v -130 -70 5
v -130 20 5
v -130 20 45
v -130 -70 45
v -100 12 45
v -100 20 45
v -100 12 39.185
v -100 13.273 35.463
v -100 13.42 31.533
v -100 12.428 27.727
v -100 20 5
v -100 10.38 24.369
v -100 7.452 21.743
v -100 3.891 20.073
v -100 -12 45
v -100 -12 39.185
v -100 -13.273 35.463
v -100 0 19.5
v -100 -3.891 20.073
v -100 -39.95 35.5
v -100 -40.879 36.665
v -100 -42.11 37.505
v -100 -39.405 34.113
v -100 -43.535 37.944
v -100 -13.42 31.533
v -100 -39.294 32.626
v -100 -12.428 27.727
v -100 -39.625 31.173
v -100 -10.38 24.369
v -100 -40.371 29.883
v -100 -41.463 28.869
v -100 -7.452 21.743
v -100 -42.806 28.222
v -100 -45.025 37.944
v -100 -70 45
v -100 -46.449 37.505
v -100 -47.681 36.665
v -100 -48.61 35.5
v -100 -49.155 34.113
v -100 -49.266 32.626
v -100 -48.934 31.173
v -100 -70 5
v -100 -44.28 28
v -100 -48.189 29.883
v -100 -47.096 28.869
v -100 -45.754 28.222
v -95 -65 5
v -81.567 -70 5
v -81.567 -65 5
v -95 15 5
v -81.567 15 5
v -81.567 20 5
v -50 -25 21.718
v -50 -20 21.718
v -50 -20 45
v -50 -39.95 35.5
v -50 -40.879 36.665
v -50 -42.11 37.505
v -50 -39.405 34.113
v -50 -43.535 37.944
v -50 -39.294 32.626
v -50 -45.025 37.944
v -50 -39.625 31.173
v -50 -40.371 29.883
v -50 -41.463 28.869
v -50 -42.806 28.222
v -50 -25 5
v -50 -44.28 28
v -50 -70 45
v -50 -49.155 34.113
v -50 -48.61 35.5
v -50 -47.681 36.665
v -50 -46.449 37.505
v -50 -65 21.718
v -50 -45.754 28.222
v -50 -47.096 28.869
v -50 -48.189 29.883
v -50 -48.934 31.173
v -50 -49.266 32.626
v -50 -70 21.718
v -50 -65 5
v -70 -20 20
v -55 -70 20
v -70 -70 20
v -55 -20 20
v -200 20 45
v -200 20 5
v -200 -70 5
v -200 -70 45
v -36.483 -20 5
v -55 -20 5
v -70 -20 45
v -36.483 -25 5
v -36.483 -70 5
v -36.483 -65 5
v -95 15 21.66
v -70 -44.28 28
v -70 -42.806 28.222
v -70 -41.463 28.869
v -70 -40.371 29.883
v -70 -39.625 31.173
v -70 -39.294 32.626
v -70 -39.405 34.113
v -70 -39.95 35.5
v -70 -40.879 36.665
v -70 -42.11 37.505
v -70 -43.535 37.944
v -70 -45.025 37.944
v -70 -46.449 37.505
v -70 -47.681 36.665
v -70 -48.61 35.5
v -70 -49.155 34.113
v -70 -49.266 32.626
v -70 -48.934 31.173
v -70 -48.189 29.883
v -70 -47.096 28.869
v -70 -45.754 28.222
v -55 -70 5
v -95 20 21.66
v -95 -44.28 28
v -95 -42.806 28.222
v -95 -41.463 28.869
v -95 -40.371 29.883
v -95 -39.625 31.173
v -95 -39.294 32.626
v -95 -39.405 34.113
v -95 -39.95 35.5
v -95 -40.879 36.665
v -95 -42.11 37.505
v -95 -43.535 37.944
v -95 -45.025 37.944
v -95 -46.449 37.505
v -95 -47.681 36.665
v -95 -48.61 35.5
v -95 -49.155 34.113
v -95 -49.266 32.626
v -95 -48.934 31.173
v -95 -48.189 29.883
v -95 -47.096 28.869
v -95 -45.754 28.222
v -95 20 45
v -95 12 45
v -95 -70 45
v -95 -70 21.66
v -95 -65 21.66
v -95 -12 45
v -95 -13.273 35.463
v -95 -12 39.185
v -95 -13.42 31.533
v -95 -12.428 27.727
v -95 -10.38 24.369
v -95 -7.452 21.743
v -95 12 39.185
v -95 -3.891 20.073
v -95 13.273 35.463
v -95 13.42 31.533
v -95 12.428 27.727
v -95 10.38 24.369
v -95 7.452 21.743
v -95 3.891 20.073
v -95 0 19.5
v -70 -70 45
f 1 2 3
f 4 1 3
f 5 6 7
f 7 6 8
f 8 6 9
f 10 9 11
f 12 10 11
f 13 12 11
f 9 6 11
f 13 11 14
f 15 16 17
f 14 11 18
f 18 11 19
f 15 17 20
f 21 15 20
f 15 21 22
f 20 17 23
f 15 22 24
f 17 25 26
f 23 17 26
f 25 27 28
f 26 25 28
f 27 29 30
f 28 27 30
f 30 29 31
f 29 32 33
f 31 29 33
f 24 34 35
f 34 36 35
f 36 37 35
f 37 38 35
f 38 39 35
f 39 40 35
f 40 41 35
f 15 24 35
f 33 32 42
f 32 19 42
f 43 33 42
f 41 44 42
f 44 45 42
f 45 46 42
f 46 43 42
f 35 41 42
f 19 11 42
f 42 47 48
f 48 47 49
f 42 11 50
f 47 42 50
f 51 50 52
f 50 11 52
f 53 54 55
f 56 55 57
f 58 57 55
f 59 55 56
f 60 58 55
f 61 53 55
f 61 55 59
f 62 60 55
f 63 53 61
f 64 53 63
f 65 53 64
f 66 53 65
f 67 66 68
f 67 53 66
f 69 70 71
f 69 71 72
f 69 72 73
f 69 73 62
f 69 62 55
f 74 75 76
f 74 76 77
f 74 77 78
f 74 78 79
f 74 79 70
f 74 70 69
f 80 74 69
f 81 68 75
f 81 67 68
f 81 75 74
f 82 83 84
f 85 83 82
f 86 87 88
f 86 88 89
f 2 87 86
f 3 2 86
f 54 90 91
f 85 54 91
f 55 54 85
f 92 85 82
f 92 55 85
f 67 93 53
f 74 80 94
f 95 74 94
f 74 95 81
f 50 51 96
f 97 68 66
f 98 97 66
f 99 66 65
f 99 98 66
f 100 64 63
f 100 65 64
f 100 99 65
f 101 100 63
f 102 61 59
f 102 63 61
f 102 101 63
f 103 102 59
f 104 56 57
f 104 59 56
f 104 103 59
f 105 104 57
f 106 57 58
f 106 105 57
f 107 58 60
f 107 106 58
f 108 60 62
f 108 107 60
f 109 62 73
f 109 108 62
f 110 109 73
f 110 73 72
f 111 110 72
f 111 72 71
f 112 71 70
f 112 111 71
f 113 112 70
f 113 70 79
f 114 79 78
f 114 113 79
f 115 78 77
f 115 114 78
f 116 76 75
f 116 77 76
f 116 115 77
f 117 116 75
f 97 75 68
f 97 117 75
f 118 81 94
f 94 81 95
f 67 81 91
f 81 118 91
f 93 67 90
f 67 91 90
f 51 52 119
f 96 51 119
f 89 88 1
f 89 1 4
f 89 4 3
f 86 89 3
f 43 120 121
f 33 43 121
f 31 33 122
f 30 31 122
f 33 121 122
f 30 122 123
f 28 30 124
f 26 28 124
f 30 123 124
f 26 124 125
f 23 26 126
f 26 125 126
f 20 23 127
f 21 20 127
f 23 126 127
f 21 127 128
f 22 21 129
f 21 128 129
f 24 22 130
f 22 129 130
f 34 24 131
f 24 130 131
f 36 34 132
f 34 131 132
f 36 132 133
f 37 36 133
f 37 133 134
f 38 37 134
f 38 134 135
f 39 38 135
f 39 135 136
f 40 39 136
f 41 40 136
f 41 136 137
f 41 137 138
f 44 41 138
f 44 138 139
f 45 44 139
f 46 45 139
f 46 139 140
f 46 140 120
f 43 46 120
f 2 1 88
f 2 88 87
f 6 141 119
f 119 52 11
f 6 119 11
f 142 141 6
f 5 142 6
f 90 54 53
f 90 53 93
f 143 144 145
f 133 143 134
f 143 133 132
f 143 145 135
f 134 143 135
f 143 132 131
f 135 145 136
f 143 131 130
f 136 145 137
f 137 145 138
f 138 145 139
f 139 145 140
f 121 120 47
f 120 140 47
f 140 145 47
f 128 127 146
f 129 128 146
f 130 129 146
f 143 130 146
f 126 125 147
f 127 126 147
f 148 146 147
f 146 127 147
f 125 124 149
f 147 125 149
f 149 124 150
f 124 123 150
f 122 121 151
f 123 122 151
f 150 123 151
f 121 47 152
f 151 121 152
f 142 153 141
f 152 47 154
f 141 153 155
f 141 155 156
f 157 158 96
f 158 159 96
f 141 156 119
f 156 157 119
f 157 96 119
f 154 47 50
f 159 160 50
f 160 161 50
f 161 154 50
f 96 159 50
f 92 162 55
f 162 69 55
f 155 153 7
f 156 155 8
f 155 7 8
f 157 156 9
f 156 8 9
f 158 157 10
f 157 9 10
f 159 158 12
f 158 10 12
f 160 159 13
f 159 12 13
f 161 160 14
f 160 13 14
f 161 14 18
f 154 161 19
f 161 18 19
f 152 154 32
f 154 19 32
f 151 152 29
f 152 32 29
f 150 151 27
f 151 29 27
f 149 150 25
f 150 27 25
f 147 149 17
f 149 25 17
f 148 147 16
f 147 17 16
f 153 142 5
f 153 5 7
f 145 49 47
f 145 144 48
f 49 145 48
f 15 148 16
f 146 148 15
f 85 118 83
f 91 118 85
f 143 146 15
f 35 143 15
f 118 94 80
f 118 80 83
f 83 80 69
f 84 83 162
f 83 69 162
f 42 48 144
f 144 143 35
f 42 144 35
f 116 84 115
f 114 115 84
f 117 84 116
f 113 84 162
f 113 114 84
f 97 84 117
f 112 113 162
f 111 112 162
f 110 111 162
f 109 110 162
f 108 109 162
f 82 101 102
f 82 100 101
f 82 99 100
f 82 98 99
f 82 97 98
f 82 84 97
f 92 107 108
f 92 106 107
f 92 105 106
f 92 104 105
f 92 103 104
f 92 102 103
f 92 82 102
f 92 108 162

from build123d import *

# Parameters (mm, degrees)
SKETCH1_W            = 300
SKETCH1_H            = 200
BOSS_EXTRUDE1_DEPTH  = 5
SKETCH3_W            = 20
SKETCH3_H            = 20
SKETCH3_H_2          = 40
CUT_EXTRUDE1_DEPTH   = 5
SKETCH4_W            = 20
SKETCH4_H            = 40
CUT_EXTRUDE2_DEPTH   = 10
SKETCH6_W            = 300
SKETCH6_H            = 200
BOSS_EXTRUDE2_DEPTH  = 5
BOSS_EXTRUDE4_DEPTH  = 40
SKETCH8_3_W          = 5
SKETCH8_3_H          = 40
BOSS_EXTRUDE5_DEPTH  = 40
CUT_EXTRUDE3_DEPTH   = 236
SKETCH10_R           = 5
CUT_EXTRUDE4_DEPTH   = 236
BOSS_EXTRUDE6_DEPTH  = 5
BOSS_EXTRUDE7_DEPTH  = 5
BOSS_EXTRUDE8_DEPTH  = 5
CUT_EXTRUDE5_DEPTH   = 10
SKETCH19_W           = 25
SKETCH19_H           = 50
BOSS_EXTRUDE10_DEPTH = 15
BOSS_EXTRUDE11_DEPTH = 5
SKETCH22_R           = 5
CUT_EXTRUDE6_DEPTH   = 39
SKETCH23_R           = 13.5
CUT_EXTRUDE7_DEPTH   = 10
SKETCH25_W           = 300
SKETCH25_H           = 200
SKETCH25_W_2         = 63.516764864
SKETCH25_H_2         = 90
CUT_EXTRUDE8_DEPTH   = 195
SKETCH25_2_W         = 300
SKETCH25_2_H         = 200
CUT_EXTRUDE9_DEPTH   = 195
SKETCH26_W           = 40
SKETCH26_H           = 90
BOSS_EXTRUDE12_DEPTH = 70


with BuildPart() as part:
    # Sketch1 → Boss-Extrude1 (new body)
    with BuildSketch(Plane.XY):
        Rectangle(SKETCH1_W, SKETCH1_H)
    extrude(amount=BOSS_EXTRUDE1_DEPTH)

    # Sketch3 → Cut-Extrude1 (cut)
    with BuildSketch(Plane.XY.offset(5)):
        with Locations((-140, -90)):
            Rectangle(SKETCH3_W, SKETCH3_H)
        with Locations((-140, 80)):
            Rectangle(SKETCH3_W, SKETCH3_H_2)
        with Locations((140, 80)):
            Rectangle(SKETCH3_W, SKETCH3_H_2)
        with Locations((140, -90)):
            Rectangle(SKETCH3_W, SKETCH3_H)
    extrude(amount=-CUT_EXTRUDE1_DEPTH, mode=Mode.SUBTRACT)

    # Sketch4 → Cut-Extrude2 (cut)
    with BuildSketch(Plane(origin=(0, 0, 0), x_dir=(-1, 0, 0), z_dir=(0, 0, -1))):
        with Locations((-140, -80)):
            Rectangle(SKETCH4_W, SKETCH4_H)
        with Locations((140, -80)):
            Rectangle(SKETCH4_W, SKETCH4_H)
    extrude(amount=-CUT_EXTRUDE2_DEPTH, mode=Mode.SUBTRACT)

    # Sketch6 → Boss-Extrude2 (add)
    with BuildSketch(Plane(origin=(0, 0, 0), x_dir=(-1, 0, 0), z_dir=(0, 0, -1))):
        Rectangle(SKETCH6_W, SKETCH6_H)
    extrude(amount=-BOSS_EXTRUDE2_DEPTH)

    # Sketch8 → Boss-Extrude4 (add)
    with BuildSketch(Plane.XY.offset(5)):
        Polygon((-100, 20), (-95, 20), (-95, -20), (-95, -70), (-100, -70), (-100, -20), align=None)
    boss_extrude4 = extrude(amount=BOSS_EXTRUDE4_DEPTH)

    # Sketch8<3> → Boss-Extrude5 (add)
    with BuildSketch(Plane.XY.offset(5)):
        with Locations((57.5, 0)):
            Rectangle(SKETCH8_3_W, SKETCH8_3_H)
    extrude(amount=BOSS_EXTRUDE5_DEPTH)

    # Sketch9 → Cut-Extrude3 (cut)
    with BuildSketch(Plane(origin=(60, 0, 0), x_dir=(0, 0, -1), z_dir=(1, 0, 0))):
        with BuildLine():
            Line((-45, 12), (-33, 12))
            ThreePointArc((-33, 12), (-21, 0), (-33, -12))
            Line((-33, -12), (-45, -12))
            Line((-45, -12), (-45, 12))
        make_face()
    extrude(amount=-CUT_EXTRUDE3_DEPTH, mode=Mode.SUBTRACT)

    # Sketch10 → Cut-Extrude4 (cut)
    with BuildSketch(Plane(origin=(-95, 0, 0), x_dir=(0, 0, -1), z_dir=(1, 0, 0))):
        with Locations((-33, -44.279864558)):
            Circle(SKETCH10_R)
    cut_extrude4 = extrude(amount=-CUT_EXTRUDE4_DEPTH, mode=Mode.SUBTRACT)

    # Sketch11 → Boss-Extrude6 (add)
    with BuildSketch(Plane.XZ.offset(70)):
        Polygon((-95, 21.66038922), (-81.566809401, 5), (-95, 5), align=None)
    extrude(amount=-BOSS_EXTRUDE6_DEPTH)

    # Sketch12 → Boss-Extrude7 (add)
    with BuildSketch(Plane(origin=(0, 20, 0), x_dir=(1, 0, 0), z_dir=(0, 1, 0))):
        Polygon((60, -21), (73.767048753, -5), (60, -5), align=None)
    boss_extrude7 = extrude(amount=-BOSS_EXTRUDE7_DEPTH)

    # Sketch12<3> → Boss-Extrude8 (add)
    with BuildSketch(Plane(origin=(0, 20, 0), x_dir=(1, 0, 0), z_dir=(0, 1, 0))):
        Polygon((-81.566809401, -5), (-95, -21.66038922), (-95, -5), align=None)
    extrude(amount=-BOSS_EXTRUDE8_DEPTH)

    # Mirror1: Boss-Extrude7 across plane
    add(boss_extrude7.mirror(Plane(origin=(0, 0, 0), x_dir=(0, 0, 1), z_dir=(0, -1, 0))))

    # Mirror3: Boss-Extrude4, Cut-Extrude4 across plane
    add(boss_extrude4.mirror(Plane(origin=(-75, 0, 0), x_dir=(0, 0, 1), z_dir=(1, 0, 0))))
    add(cut_extrude4.mirror(Plane(origin=(-75, 0, 0), x_dir=(0, 0, 1), z_dir=(1, 0, 0))), mode=Mode.SUBTRACT)

    # Sketch17 → Cut-Extrude5 (cut)
    with BuildSketch(Plane.ZY.offset(55)):
        Polygon((5, -20), (45, -20), (45, -12), (45, 20), (5, 20), align=None)
    extrude(amount=-CUT_EXTRUDE5_DEPTH, mode=Mode.SUBTRACT)

    # Sketch19 → Boss-Extrude10 (add)
    with BuildSketch(Plane.ZY.offset(55)):
        with Locations((32.5, -45)):
            Rectangle(SKETCH19_W, SKETCH19_H)
    extrude(amount=BOSS_EXTRUDE10_DEPTH)

    # Sketch20 → Boss-Extrude11 (add)
    with BuildSketch(Plane.XZ.offset(70)):
        Polygon((-50, 21.717977163), (-36.483235136, 5), (-50, 5), align=None)
    boss_extrude11 = extrude(amount=-BOSS_EXTRUDE11_DEPTH)

    # Mirror4: Boss-Extrude11 across plane
    add(boss_extrude11.mirror(Plane.ZX.offset(-45)))

    # Sketch22 → Cut-Extrude6 (cut)
    with BuildSketch(Plane(origin=(-75, 0, 0), x_dir=(0, 0, -1), z_dir=(1, 0, 0))):
        with Locations((-33, -44.279864558)):
            Circle(SKETCH22_R)
    extrude(amount=CUT_EXTRUDE6_DEPTH, mode=Mode.SUBTRACT)

    # Sketch23 → Cut-Extrude7 (cut)
    with BuildSketch(Plane.ZY.offset(100)):
        with Locations((33, 0)):
            Circle(SKETCH23_R)
    extrude(amount=-CUT_EXTRUDE7_DEPTH, mode=Mode.SUBTRACT)

    # Sketch25 → Cut-Extrude8 (cut)
    with BuildSketch(Plane.XY.offset(5)):
        Rectangle(SKETCH25_W, SKETCH25_H)
        with Locations((-68.241617568, -25)):
            Rectangle(SKETCH25_W_2, SKETCH25_H_2, mode=Mode.SUBTRACT)
    extrude(amount=CUT_EXTRUDE8_DEPTH, mode=Mode.SUBTRACT)

    # Sketch25<2> → Cut-Extrude9 (cut)
    with BuildSketch(Plane.XY.offset(5)):
        Rectangle(SKETCH25_2_W, SKETCH25_2_H)
    extrude(amount=-CUT_EXTRUDE9_DEPTH, mode=Mode.SUBTRACT)


with BuildPart() as cut_extrude9_piece_1:
    # of the separate pieces the step leaves, piece 1, a body of its own (cut_extrude9_pieces)
    add(part.part.solids().sort_by_distance((-50, -70, 21.717977163))[0])


with BuildPart() as cut_extrude9_piece_2:
    # of the separate pieces the step leaves, piece 2, a body of its own (cut_extrude9_pieces)
    add(part.part.solids().sort_by_distance((-81.566809401, 20, 5))[0])


with BuildPart() as body_3:
    # Sketch26 → Boss-Extrude12 (new body)
    with BuildSketch(Plane.ZY.offset(130)):
        with Locations((25, -25)):
            Rectangle(SKETCH26_W, SKETCH26_H)
    extrude(amount=BOSS_EXTRUDE12_DEPTH)


solid = Compound([cut_extrude9_piece_1.part, cut_extrude9_piece_2.part, body_3.part])
